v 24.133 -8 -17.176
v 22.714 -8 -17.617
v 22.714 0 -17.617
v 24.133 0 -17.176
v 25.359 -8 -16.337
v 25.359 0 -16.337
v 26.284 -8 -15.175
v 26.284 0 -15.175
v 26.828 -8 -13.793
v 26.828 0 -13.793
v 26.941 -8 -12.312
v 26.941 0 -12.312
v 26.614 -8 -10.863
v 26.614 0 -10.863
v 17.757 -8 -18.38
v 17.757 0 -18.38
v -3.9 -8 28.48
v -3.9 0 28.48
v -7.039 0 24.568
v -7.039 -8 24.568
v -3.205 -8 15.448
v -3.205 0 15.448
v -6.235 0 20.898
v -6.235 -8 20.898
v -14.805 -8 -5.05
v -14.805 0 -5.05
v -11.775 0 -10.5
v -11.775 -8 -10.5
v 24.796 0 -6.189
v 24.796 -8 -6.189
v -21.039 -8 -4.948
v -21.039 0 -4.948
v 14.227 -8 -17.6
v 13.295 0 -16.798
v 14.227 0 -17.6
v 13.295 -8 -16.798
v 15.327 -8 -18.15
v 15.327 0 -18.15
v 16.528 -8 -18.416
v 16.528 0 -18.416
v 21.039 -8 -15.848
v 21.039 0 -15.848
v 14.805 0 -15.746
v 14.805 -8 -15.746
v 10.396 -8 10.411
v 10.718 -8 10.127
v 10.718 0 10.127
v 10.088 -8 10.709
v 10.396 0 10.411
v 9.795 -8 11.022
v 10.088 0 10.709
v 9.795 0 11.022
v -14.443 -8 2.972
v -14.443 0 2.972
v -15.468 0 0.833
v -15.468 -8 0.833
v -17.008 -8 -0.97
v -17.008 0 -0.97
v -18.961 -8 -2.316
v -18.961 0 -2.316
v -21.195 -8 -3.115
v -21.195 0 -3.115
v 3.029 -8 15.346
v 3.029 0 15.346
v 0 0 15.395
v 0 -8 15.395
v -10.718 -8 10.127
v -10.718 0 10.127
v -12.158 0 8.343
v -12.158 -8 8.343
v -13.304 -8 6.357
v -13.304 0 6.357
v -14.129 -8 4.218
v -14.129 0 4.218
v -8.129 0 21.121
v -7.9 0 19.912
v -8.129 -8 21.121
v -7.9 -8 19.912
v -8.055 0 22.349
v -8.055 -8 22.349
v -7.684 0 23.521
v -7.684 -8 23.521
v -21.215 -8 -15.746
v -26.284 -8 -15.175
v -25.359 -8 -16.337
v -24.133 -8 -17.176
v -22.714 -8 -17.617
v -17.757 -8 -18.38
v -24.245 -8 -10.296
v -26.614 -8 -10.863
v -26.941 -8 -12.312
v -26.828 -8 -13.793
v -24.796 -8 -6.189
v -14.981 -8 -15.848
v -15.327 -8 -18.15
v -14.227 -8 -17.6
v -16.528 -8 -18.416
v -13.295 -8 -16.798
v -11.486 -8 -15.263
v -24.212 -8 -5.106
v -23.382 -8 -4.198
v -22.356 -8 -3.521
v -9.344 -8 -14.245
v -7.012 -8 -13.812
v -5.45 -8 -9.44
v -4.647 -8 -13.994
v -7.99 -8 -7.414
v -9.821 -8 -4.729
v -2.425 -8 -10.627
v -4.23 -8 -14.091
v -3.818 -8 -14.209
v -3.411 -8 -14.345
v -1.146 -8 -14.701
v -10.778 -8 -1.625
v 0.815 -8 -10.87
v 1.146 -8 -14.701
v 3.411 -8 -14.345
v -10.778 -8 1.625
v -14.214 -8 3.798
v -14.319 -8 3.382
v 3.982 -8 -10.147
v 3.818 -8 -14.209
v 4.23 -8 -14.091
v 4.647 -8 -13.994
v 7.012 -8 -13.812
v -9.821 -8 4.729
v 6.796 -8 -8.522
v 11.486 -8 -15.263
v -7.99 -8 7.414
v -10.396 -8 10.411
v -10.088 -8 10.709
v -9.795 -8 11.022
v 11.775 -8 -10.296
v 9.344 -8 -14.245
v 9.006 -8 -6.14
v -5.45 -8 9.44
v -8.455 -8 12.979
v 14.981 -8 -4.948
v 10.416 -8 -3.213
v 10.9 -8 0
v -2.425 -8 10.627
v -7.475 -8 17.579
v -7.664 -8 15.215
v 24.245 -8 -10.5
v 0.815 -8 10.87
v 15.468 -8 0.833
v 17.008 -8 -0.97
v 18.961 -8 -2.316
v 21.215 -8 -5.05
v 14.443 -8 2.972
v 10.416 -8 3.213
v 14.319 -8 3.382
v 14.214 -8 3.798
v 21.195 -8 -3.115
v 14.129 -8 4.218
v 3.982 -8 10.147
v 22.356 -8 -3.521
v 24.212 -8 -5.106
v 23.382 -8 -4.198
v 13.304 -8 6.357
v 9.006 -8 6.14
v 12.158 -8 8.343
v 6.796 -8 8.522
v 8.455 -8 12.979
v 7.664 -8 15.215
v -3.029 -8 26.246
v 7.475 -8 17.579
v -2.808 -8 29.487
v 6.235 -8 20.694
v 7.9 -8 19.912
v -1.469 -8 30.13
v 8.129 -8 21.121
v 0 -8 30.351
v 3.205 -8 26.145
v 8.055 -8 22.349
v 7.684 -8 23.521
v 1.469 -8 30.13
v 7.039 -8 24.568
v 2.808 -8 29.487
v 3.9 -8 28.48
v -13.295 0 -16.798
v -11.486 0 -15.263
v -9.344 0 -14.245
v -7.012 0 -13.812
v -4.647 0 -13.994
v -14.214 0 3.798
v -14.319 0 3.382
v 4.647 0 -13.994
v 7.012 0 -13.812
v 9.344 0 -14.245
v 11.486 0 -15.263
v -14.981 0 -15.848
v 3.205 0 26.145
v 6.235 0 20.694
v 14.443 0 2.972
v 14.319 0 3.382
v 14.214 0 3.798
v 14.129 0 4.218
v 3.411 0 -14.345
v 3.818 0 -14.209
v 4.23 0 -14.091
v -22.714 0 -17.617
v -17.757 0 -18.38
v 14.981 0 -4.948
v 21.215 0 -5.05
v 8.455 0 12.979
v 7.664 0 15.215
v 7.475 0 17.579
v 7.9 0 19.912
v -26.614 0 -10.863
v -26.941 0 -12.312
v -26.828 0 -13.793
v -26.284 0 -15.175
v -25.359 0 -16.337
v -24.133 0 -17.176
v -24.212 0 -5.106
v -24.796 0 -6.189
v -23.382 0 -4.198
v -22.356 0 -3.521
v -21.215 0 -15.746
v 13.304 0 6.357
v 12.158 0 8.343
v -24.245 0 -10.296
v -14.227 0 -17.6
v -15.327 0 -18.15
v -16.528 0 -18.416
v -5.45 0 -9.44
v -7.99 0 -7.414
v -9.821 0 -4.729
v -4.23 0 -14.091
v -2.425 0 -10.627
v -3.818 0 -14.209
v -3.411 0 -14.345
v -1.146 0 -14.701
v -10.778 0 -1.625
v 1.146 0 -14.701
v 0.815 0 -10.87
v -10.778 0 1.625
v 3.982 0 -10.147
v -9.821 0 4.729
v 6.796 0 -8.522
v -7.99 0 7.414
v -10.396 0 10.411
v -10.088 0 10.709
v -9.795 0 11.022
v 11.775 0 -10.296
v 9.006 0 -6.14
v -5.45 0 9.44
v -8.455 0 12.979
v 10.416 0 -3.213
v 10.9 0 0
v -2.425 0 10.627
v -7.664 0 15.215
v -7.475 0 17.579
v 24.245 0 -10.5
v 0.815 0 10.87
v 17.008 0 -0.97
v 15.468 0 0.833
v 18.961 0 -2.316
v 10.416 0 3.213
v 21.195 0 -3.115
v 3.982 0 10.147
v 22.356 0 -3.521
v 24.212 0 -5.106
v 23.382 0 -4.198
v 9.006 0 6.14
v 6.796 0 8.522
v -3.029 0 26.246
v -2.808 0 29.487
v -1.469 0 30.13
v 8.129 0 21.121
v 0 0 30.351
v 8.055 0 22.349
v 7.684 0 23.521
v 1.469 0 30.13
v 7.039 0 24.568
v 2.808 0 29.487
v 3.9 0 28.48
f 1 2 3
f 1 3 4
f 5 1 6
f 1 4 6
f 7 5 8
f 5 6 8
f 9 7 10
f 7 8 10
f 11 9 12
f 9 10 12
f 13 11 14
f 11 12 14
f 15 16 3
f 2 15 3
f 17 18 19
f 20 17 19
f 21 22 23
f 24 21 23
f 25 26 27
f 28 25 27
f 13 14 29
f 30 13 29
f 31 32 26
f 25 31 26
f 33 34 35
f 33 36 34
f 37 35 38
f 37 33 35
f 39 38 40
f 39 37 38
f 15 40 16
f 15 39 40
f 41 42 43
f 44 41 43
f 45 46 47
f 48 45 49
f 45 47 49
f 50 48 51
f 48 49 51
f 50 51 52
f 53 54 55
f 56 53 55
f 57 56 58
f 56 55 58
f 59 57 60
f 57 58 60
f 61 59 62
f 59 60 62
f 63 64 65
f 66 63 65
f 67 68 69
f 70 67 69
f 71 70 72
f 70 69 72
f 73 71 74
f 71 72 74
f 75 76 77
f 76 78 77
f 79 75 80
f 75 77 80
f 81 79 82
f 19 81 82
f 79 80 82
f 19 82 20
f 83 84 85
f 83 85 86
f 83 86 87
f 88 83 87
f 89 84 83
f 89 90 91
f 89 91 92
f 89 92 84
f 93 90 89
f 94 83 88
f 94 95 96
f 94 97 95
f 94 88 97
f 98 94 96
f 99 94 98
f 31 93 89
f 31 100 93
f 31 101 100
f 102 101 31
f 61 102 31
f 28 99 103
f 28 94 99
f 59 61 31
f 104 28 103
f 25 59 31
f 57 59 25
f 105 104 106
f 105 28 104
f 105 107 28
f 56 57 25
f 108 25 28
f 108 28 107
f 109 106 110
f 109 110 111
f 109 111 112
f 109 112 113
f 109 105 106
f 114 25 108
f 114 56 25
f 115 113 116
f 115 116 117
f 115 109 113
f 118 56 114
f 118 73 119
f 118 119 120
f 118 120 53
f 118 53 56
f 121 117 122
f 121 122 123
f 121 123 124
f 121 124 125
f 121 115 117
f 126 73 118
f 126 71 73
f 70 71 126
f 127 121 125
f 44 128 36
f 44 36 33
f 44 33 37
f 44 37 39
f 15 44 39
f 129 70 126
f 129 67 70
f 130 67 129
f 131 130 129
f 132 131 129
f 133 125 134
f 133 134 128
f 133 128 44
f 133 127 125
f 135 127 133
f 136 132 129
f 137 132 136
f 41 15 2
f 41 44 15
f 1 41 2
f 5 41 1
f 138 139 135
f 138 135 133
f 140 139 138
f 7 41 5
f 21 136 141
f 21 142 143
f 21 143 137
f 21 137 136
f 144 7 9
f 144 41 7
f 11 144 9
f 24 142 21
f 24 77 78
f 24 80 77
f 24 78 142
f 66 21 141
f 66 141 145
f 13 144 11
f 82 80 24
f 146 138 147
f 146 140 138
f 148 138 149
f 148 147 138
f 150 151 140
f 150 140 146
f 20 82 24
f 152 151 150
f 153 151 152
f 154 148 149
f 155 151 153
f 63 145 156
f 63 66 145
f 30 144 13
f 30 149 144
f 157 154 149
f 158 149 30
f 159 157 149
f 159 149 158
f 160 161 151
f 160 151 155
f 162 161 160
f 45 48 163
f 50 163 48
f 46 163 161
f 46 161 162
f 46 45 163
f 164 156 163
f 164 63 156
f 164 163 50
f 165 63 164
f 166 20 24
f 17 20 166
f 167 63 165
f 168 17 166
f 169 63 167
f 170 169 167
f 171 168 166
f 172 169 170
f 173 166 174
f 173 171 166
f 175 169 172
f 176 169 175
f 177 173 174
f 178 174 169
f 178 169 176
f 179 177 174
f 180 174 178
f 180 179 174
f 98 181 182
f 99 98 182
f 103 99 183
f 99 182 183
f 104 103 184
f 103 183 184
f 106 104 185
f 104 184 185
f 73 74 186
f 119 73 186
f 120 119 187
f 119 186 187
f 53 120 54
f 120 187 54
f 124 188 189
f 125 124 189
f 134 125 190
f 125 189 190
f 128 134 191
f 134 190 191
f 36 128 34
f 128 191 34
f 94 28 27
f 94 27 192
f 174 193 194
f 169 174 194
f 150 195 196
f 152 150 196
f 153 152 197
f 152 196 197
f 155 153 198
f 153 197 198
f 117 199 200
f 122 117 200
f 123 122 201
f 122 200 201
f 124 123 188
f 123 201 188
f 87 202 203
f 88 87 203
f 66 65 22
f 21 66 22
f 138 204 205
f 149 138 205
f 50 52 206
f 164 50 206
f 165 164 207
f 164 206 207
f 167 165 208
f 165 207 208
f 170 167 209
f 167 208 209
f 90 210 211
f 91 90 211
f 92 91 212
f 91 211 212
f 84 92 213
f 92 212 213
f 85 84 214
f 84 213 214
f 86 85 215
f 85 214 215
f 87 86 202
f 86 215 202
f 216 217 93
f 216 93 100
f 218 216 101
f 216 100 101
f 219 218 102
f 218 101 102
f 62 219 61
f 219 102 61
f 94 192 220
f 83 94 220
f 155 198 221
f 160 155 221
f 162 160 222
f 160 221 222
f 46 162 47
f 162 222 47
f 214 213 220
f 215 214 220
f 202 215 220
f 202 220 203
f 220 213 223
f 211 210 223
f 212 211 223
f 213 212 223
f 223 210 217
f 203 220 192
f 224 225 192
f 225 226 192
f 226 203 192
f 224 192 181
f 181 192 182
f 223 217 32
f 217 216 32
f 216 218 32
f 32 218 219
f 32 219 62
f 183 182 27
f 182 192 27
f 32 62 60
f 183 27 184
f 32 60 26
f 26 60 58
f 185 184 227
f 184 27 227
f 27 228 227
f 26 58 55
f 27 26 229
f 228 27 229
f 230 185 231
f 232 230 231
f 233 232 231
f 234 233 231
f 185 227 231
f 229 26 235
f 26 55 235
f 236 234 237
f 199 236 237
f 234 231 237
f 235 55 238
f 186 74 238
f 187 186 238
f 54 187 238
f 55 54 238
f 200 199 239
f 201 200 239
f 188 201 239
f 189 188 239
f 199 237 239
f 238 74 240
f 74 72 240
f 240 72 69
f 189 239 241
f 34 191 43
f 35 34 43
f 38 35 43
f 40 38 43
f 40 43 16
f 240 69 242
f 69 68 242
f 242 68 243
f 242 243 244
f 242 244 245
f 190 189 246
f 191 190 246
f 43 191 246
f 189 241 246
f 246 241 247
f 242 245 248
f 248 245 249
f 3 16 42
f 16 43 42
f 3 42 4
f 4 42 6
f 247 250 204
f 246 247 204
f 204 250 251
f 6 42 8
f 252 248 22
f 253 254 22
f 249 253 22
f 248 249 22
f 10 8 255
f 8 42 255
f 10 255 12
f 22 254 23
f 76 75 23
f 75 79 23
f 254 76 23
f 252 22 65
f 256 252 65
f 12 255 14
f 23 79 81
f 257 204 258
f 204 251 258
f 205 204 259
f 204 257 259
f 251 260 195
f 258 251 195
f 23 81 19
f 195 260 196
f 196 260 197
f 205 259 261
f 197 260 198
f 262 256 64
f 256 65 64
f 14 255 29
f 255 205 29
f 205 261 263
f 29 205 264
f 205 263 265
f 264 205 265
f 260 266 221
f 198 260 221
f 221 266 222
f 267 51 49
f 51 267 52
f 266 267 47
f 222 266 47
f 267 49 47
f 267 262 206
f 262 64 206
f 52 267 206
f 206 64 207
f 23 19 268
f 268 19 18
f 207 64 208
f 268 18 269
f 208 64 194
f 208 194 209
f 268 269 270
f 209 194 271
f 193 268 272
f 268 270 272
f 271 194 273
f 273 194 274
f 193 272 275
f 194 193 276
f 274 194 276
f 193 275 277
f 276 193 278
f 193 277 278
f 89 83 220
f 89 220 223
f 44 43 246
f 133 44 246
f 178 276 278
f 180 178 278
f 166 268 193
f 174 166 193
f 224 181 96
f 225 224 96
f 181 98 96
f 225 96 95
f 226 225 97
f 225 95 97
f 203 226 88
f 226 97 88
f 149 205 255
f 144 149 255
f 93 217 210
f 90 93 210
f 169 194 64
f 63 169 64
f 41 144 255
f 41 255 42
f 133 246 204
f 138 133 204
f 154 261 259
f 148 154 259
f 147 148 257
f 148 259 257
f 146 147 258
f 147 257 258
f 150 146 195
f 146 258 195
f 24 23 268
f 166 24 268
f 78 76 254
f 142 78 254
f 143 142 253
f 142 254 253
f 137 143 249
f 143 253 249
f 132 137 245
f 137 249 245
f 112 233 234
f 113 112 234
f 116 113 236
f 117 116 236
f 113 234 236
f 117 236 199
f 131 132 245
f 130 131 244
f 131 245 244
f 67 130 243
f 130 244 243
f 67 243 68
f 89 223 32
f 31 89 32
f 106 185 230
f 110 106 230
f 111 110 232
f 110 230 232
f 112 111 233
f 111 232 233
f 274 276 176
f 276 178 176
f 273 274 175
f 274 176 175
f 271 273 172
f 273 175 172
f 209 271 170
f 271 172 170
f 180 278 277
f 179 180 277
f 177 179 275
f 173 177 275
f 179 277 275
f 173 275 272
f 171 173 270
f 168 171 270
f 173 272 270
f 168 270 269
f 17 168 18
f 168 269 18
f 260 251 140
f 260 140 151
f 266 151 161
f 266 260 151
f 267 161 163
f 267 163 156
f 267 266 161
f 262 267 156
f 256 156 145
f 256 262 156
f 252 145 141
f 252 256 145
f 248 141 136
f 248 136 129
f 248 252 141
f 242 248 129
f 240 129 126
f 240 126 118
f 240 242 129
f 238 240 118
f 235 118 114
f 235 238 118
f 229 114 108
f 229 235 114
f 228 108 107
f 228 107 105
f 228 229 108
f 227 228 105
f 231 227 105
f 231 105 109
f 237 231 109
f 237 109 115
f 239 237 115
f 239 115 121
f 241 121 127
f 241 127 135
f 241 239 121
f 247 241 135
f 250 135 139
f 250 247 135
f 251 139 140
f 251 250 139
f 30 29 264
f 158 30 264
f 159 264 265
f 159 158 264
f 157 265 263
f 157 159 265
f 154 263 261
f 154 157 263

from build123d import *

# Parameters (mm, degrees)
F0_R     = 10.9
F1_DEPTH = 8
F2_R     = 5


with BuildPart() as f1:
    # F0 (on Front) → F1 (new body)
    with BuildSketch(Plane.XZ):
        with BuildLine():
            ThreePointArc((-4.6474292299, -13.9936443391), (-12.7697106566, -7.372595885), (-14.4425661041, 2.9720303942))
            ThreePointArc((-14.4425661041, 2.9720303942), (-17.9890829323, -1.7394577094), (-23.6744608764, -3.305465179))
            Line((-23.6744608764, -3.305465179), (-26.6141080798, -10.8626586404))
            ThreePointArc((-26.6141080798, -10.8626586404), (-26.2843656104, -15.1752855606), (-22.7143923751, -17.617164376))
            Line((-22.7143923751, -17.617164376), (-14.6998472546, -18.8499519504))
            ThreePointArc((-14.6998472546, -18.8499519504), (-10.5009560313, -14.7092739554), (-4.6474292299, -13.9936443391))
        make_face()
        Polygon((-21.2154018643, -15.7464514283), (-24.2445278885, -10.2962775292), (-21.039101849, -4.9478904915), (-14.8045497853, -5.0496773528), (-11.7754237611, -10.4998512519), (-14.9808498006, -15.8482382896), align=None, mode=Mode.SUBTRACT)
        with BuildLine():
            ThreePointArc((9.7951368743, 11.0216139449), (5.2395070905, 13.7828968575), (0, 14.7451917701))
            ThreePointArc((0, 14.7451917701), (-5.2395070905, 13.7828968575), (-9.7951368743, 11.0216139449))
            ThreePointArc((-9.7951368743, 11.0216139449), (-10.2405850834, 10.5580719376), (-10.7175072848, 10.1269797045))
            ThreePointArc((-10.7175072848, 10.1269797045), (-12.7697106566, 7.372595885), (-14.1289753301, 4.2181437217))
            ThreePointArc((-14.1289753301, 4.2181437217), (-14.2638510546, 3.5895708631), (-14.4425661041, 2.9720303942))
            ThreePointArc((-14.4425661041, 2.9720303942), (-12.7697106566, -7.372595885), (-4.6474292299, -13.9936443391))
            ThreePointArc((-4.6474292299, -13.9936443391), (-4.0232659712, -14.1476428006), (-3.4114680453, -14.3451234262))
            ThreePointArc((-3.4114680453, -14.3451234262), (0, -14.7451917701), (3.4114680453, -14.3451234262))
            ThreePointArc((3.4114680453, -14.3451234262), (4.0232659712, -14.1476428006), (4.6474292299, -13.9936443391))
            ThreePointArc((4.6474292299, -13.9936443391), (11.9571718138, -8.6282514191), (14.7451917701, 0))
            ThreePointArc((14.7451917701, 0), (14.6693402577, 1.4936990123), (14.4425661041, 2.9720303942))
            ThreePointArc((14.4425661041, 2.9720303942), (14.2638510546, 3.5895708631), (14.1289753301, 4.2181437217))
            ThreePointArc((14.1289753301, 4.2181437217), (12.7697106566, 7.372595885), (10.7175072848, 10.1269797045))
            ThreePointArc((10.7175072848, 10.1269797045), (10.2405850834, 10.5580719376), (9.7951368743, 11.0216139449))
        make_face()
        Circle(F0_R, mode=Mode.SUBTRACT)
        with BuildLine():
            ThreePointArc((23.6744608764, -3.305465179), (17.9890829323, -1.7394577094), (14.4425661041, 2.9720303942))
            ThreePointArc((14.4425661041, 2.9720303942), (14.6693402577, 1.4936990123), (14.7451917701, 0))
            ThreePointArc((14.7451917701, 0), (11.9571718138, -8.6282514191), (4.6474292299, -13.9936443391))
            ThreePointArc((4.6474292299, -13.9936443391), (10.5009560313, -14.7092739554), (14.6998472546, -18.8499519504))
            Line((14.6998472546, -18.8499519504), (22.7143923751, -17.617164376))
            ThreePointArc((22.7143923751, -17.617164376), (26.2843656104, -15.1752855606), (26.6141080798, -10.8626586404))
            Line((26.6141080798, -10.8626586404), (23.6744608764, -3.305465179))
        make_face()
        Polygon((24.2445278885, -10.4998512519), (21.039101849, -15.8482382896), (14.8045497853, -15.7464514283), (11.7754237611, -10.2962775292), (14.9808498006, -4.9478904915), (21.2154018643, -5.0496773528), align=None, mode=Mode.SUBTRACT)
        with BuildLine():
            ThreePointArc((-9.7951368743, 11.0216139449), (-5.2395070905, 13.7828968575), (0, 14.7451917701))
            ThreePointArc((0, 14.7451917701), (5.2395070905, 13.7828968575), (9.7951368743, 11.0216139449))
            ThreePointArc((9.7951368743, 11.0216139449), (7.488126901, 16.4487316648), (8.9746136218, 22.1554171294))
            Line((8.9746136218, 22.1554171294), (3.8997157047, 28.4798230164))
            ThreePointArc((3.8997157047, 28.4798230164), (0, 30.3505711213), (-3.8997157047, 28.4798230164))
            Line((-3.8997157047, 28.4798230164), (-8.9746136218, 22.1554171294))
            ThreePointArc((-8.9746136218, 22.1554171294), (-7.488126901, 16.4487316648), (-9.7951368743, 11.0216139449))
        make_face()
        Polygon((3.0291260242, 15.3459548821), (0, 15.3954091536), (-3.2054260395, 15.4477417434), (-6.2345520637, 20.8979156424), (-3.0291260242, 26.2463026801), (3.2054260395, 26.1445158188), (6.2345520637, 20.6943419198), align=None, mode=Mode.SUBTRACT)
    extrude(amount=F1_DEPTH)

    # F2
    f2_edges = [f1.edges().sort_by_distance(p)[0] for p in [
        (-23.674461, -4, -3.305465),
        (-14.699847, -4, -18.849952),
        (14.699847, -4, -18.849952),
        (23.674461, -4, -3.305465),
        (8.974614, -4, 22.155417),
        (-8.974614, -4, 22.155417),
    ]]
    fillet(f2_edges, radius=F2_R)


solid = f1.part
